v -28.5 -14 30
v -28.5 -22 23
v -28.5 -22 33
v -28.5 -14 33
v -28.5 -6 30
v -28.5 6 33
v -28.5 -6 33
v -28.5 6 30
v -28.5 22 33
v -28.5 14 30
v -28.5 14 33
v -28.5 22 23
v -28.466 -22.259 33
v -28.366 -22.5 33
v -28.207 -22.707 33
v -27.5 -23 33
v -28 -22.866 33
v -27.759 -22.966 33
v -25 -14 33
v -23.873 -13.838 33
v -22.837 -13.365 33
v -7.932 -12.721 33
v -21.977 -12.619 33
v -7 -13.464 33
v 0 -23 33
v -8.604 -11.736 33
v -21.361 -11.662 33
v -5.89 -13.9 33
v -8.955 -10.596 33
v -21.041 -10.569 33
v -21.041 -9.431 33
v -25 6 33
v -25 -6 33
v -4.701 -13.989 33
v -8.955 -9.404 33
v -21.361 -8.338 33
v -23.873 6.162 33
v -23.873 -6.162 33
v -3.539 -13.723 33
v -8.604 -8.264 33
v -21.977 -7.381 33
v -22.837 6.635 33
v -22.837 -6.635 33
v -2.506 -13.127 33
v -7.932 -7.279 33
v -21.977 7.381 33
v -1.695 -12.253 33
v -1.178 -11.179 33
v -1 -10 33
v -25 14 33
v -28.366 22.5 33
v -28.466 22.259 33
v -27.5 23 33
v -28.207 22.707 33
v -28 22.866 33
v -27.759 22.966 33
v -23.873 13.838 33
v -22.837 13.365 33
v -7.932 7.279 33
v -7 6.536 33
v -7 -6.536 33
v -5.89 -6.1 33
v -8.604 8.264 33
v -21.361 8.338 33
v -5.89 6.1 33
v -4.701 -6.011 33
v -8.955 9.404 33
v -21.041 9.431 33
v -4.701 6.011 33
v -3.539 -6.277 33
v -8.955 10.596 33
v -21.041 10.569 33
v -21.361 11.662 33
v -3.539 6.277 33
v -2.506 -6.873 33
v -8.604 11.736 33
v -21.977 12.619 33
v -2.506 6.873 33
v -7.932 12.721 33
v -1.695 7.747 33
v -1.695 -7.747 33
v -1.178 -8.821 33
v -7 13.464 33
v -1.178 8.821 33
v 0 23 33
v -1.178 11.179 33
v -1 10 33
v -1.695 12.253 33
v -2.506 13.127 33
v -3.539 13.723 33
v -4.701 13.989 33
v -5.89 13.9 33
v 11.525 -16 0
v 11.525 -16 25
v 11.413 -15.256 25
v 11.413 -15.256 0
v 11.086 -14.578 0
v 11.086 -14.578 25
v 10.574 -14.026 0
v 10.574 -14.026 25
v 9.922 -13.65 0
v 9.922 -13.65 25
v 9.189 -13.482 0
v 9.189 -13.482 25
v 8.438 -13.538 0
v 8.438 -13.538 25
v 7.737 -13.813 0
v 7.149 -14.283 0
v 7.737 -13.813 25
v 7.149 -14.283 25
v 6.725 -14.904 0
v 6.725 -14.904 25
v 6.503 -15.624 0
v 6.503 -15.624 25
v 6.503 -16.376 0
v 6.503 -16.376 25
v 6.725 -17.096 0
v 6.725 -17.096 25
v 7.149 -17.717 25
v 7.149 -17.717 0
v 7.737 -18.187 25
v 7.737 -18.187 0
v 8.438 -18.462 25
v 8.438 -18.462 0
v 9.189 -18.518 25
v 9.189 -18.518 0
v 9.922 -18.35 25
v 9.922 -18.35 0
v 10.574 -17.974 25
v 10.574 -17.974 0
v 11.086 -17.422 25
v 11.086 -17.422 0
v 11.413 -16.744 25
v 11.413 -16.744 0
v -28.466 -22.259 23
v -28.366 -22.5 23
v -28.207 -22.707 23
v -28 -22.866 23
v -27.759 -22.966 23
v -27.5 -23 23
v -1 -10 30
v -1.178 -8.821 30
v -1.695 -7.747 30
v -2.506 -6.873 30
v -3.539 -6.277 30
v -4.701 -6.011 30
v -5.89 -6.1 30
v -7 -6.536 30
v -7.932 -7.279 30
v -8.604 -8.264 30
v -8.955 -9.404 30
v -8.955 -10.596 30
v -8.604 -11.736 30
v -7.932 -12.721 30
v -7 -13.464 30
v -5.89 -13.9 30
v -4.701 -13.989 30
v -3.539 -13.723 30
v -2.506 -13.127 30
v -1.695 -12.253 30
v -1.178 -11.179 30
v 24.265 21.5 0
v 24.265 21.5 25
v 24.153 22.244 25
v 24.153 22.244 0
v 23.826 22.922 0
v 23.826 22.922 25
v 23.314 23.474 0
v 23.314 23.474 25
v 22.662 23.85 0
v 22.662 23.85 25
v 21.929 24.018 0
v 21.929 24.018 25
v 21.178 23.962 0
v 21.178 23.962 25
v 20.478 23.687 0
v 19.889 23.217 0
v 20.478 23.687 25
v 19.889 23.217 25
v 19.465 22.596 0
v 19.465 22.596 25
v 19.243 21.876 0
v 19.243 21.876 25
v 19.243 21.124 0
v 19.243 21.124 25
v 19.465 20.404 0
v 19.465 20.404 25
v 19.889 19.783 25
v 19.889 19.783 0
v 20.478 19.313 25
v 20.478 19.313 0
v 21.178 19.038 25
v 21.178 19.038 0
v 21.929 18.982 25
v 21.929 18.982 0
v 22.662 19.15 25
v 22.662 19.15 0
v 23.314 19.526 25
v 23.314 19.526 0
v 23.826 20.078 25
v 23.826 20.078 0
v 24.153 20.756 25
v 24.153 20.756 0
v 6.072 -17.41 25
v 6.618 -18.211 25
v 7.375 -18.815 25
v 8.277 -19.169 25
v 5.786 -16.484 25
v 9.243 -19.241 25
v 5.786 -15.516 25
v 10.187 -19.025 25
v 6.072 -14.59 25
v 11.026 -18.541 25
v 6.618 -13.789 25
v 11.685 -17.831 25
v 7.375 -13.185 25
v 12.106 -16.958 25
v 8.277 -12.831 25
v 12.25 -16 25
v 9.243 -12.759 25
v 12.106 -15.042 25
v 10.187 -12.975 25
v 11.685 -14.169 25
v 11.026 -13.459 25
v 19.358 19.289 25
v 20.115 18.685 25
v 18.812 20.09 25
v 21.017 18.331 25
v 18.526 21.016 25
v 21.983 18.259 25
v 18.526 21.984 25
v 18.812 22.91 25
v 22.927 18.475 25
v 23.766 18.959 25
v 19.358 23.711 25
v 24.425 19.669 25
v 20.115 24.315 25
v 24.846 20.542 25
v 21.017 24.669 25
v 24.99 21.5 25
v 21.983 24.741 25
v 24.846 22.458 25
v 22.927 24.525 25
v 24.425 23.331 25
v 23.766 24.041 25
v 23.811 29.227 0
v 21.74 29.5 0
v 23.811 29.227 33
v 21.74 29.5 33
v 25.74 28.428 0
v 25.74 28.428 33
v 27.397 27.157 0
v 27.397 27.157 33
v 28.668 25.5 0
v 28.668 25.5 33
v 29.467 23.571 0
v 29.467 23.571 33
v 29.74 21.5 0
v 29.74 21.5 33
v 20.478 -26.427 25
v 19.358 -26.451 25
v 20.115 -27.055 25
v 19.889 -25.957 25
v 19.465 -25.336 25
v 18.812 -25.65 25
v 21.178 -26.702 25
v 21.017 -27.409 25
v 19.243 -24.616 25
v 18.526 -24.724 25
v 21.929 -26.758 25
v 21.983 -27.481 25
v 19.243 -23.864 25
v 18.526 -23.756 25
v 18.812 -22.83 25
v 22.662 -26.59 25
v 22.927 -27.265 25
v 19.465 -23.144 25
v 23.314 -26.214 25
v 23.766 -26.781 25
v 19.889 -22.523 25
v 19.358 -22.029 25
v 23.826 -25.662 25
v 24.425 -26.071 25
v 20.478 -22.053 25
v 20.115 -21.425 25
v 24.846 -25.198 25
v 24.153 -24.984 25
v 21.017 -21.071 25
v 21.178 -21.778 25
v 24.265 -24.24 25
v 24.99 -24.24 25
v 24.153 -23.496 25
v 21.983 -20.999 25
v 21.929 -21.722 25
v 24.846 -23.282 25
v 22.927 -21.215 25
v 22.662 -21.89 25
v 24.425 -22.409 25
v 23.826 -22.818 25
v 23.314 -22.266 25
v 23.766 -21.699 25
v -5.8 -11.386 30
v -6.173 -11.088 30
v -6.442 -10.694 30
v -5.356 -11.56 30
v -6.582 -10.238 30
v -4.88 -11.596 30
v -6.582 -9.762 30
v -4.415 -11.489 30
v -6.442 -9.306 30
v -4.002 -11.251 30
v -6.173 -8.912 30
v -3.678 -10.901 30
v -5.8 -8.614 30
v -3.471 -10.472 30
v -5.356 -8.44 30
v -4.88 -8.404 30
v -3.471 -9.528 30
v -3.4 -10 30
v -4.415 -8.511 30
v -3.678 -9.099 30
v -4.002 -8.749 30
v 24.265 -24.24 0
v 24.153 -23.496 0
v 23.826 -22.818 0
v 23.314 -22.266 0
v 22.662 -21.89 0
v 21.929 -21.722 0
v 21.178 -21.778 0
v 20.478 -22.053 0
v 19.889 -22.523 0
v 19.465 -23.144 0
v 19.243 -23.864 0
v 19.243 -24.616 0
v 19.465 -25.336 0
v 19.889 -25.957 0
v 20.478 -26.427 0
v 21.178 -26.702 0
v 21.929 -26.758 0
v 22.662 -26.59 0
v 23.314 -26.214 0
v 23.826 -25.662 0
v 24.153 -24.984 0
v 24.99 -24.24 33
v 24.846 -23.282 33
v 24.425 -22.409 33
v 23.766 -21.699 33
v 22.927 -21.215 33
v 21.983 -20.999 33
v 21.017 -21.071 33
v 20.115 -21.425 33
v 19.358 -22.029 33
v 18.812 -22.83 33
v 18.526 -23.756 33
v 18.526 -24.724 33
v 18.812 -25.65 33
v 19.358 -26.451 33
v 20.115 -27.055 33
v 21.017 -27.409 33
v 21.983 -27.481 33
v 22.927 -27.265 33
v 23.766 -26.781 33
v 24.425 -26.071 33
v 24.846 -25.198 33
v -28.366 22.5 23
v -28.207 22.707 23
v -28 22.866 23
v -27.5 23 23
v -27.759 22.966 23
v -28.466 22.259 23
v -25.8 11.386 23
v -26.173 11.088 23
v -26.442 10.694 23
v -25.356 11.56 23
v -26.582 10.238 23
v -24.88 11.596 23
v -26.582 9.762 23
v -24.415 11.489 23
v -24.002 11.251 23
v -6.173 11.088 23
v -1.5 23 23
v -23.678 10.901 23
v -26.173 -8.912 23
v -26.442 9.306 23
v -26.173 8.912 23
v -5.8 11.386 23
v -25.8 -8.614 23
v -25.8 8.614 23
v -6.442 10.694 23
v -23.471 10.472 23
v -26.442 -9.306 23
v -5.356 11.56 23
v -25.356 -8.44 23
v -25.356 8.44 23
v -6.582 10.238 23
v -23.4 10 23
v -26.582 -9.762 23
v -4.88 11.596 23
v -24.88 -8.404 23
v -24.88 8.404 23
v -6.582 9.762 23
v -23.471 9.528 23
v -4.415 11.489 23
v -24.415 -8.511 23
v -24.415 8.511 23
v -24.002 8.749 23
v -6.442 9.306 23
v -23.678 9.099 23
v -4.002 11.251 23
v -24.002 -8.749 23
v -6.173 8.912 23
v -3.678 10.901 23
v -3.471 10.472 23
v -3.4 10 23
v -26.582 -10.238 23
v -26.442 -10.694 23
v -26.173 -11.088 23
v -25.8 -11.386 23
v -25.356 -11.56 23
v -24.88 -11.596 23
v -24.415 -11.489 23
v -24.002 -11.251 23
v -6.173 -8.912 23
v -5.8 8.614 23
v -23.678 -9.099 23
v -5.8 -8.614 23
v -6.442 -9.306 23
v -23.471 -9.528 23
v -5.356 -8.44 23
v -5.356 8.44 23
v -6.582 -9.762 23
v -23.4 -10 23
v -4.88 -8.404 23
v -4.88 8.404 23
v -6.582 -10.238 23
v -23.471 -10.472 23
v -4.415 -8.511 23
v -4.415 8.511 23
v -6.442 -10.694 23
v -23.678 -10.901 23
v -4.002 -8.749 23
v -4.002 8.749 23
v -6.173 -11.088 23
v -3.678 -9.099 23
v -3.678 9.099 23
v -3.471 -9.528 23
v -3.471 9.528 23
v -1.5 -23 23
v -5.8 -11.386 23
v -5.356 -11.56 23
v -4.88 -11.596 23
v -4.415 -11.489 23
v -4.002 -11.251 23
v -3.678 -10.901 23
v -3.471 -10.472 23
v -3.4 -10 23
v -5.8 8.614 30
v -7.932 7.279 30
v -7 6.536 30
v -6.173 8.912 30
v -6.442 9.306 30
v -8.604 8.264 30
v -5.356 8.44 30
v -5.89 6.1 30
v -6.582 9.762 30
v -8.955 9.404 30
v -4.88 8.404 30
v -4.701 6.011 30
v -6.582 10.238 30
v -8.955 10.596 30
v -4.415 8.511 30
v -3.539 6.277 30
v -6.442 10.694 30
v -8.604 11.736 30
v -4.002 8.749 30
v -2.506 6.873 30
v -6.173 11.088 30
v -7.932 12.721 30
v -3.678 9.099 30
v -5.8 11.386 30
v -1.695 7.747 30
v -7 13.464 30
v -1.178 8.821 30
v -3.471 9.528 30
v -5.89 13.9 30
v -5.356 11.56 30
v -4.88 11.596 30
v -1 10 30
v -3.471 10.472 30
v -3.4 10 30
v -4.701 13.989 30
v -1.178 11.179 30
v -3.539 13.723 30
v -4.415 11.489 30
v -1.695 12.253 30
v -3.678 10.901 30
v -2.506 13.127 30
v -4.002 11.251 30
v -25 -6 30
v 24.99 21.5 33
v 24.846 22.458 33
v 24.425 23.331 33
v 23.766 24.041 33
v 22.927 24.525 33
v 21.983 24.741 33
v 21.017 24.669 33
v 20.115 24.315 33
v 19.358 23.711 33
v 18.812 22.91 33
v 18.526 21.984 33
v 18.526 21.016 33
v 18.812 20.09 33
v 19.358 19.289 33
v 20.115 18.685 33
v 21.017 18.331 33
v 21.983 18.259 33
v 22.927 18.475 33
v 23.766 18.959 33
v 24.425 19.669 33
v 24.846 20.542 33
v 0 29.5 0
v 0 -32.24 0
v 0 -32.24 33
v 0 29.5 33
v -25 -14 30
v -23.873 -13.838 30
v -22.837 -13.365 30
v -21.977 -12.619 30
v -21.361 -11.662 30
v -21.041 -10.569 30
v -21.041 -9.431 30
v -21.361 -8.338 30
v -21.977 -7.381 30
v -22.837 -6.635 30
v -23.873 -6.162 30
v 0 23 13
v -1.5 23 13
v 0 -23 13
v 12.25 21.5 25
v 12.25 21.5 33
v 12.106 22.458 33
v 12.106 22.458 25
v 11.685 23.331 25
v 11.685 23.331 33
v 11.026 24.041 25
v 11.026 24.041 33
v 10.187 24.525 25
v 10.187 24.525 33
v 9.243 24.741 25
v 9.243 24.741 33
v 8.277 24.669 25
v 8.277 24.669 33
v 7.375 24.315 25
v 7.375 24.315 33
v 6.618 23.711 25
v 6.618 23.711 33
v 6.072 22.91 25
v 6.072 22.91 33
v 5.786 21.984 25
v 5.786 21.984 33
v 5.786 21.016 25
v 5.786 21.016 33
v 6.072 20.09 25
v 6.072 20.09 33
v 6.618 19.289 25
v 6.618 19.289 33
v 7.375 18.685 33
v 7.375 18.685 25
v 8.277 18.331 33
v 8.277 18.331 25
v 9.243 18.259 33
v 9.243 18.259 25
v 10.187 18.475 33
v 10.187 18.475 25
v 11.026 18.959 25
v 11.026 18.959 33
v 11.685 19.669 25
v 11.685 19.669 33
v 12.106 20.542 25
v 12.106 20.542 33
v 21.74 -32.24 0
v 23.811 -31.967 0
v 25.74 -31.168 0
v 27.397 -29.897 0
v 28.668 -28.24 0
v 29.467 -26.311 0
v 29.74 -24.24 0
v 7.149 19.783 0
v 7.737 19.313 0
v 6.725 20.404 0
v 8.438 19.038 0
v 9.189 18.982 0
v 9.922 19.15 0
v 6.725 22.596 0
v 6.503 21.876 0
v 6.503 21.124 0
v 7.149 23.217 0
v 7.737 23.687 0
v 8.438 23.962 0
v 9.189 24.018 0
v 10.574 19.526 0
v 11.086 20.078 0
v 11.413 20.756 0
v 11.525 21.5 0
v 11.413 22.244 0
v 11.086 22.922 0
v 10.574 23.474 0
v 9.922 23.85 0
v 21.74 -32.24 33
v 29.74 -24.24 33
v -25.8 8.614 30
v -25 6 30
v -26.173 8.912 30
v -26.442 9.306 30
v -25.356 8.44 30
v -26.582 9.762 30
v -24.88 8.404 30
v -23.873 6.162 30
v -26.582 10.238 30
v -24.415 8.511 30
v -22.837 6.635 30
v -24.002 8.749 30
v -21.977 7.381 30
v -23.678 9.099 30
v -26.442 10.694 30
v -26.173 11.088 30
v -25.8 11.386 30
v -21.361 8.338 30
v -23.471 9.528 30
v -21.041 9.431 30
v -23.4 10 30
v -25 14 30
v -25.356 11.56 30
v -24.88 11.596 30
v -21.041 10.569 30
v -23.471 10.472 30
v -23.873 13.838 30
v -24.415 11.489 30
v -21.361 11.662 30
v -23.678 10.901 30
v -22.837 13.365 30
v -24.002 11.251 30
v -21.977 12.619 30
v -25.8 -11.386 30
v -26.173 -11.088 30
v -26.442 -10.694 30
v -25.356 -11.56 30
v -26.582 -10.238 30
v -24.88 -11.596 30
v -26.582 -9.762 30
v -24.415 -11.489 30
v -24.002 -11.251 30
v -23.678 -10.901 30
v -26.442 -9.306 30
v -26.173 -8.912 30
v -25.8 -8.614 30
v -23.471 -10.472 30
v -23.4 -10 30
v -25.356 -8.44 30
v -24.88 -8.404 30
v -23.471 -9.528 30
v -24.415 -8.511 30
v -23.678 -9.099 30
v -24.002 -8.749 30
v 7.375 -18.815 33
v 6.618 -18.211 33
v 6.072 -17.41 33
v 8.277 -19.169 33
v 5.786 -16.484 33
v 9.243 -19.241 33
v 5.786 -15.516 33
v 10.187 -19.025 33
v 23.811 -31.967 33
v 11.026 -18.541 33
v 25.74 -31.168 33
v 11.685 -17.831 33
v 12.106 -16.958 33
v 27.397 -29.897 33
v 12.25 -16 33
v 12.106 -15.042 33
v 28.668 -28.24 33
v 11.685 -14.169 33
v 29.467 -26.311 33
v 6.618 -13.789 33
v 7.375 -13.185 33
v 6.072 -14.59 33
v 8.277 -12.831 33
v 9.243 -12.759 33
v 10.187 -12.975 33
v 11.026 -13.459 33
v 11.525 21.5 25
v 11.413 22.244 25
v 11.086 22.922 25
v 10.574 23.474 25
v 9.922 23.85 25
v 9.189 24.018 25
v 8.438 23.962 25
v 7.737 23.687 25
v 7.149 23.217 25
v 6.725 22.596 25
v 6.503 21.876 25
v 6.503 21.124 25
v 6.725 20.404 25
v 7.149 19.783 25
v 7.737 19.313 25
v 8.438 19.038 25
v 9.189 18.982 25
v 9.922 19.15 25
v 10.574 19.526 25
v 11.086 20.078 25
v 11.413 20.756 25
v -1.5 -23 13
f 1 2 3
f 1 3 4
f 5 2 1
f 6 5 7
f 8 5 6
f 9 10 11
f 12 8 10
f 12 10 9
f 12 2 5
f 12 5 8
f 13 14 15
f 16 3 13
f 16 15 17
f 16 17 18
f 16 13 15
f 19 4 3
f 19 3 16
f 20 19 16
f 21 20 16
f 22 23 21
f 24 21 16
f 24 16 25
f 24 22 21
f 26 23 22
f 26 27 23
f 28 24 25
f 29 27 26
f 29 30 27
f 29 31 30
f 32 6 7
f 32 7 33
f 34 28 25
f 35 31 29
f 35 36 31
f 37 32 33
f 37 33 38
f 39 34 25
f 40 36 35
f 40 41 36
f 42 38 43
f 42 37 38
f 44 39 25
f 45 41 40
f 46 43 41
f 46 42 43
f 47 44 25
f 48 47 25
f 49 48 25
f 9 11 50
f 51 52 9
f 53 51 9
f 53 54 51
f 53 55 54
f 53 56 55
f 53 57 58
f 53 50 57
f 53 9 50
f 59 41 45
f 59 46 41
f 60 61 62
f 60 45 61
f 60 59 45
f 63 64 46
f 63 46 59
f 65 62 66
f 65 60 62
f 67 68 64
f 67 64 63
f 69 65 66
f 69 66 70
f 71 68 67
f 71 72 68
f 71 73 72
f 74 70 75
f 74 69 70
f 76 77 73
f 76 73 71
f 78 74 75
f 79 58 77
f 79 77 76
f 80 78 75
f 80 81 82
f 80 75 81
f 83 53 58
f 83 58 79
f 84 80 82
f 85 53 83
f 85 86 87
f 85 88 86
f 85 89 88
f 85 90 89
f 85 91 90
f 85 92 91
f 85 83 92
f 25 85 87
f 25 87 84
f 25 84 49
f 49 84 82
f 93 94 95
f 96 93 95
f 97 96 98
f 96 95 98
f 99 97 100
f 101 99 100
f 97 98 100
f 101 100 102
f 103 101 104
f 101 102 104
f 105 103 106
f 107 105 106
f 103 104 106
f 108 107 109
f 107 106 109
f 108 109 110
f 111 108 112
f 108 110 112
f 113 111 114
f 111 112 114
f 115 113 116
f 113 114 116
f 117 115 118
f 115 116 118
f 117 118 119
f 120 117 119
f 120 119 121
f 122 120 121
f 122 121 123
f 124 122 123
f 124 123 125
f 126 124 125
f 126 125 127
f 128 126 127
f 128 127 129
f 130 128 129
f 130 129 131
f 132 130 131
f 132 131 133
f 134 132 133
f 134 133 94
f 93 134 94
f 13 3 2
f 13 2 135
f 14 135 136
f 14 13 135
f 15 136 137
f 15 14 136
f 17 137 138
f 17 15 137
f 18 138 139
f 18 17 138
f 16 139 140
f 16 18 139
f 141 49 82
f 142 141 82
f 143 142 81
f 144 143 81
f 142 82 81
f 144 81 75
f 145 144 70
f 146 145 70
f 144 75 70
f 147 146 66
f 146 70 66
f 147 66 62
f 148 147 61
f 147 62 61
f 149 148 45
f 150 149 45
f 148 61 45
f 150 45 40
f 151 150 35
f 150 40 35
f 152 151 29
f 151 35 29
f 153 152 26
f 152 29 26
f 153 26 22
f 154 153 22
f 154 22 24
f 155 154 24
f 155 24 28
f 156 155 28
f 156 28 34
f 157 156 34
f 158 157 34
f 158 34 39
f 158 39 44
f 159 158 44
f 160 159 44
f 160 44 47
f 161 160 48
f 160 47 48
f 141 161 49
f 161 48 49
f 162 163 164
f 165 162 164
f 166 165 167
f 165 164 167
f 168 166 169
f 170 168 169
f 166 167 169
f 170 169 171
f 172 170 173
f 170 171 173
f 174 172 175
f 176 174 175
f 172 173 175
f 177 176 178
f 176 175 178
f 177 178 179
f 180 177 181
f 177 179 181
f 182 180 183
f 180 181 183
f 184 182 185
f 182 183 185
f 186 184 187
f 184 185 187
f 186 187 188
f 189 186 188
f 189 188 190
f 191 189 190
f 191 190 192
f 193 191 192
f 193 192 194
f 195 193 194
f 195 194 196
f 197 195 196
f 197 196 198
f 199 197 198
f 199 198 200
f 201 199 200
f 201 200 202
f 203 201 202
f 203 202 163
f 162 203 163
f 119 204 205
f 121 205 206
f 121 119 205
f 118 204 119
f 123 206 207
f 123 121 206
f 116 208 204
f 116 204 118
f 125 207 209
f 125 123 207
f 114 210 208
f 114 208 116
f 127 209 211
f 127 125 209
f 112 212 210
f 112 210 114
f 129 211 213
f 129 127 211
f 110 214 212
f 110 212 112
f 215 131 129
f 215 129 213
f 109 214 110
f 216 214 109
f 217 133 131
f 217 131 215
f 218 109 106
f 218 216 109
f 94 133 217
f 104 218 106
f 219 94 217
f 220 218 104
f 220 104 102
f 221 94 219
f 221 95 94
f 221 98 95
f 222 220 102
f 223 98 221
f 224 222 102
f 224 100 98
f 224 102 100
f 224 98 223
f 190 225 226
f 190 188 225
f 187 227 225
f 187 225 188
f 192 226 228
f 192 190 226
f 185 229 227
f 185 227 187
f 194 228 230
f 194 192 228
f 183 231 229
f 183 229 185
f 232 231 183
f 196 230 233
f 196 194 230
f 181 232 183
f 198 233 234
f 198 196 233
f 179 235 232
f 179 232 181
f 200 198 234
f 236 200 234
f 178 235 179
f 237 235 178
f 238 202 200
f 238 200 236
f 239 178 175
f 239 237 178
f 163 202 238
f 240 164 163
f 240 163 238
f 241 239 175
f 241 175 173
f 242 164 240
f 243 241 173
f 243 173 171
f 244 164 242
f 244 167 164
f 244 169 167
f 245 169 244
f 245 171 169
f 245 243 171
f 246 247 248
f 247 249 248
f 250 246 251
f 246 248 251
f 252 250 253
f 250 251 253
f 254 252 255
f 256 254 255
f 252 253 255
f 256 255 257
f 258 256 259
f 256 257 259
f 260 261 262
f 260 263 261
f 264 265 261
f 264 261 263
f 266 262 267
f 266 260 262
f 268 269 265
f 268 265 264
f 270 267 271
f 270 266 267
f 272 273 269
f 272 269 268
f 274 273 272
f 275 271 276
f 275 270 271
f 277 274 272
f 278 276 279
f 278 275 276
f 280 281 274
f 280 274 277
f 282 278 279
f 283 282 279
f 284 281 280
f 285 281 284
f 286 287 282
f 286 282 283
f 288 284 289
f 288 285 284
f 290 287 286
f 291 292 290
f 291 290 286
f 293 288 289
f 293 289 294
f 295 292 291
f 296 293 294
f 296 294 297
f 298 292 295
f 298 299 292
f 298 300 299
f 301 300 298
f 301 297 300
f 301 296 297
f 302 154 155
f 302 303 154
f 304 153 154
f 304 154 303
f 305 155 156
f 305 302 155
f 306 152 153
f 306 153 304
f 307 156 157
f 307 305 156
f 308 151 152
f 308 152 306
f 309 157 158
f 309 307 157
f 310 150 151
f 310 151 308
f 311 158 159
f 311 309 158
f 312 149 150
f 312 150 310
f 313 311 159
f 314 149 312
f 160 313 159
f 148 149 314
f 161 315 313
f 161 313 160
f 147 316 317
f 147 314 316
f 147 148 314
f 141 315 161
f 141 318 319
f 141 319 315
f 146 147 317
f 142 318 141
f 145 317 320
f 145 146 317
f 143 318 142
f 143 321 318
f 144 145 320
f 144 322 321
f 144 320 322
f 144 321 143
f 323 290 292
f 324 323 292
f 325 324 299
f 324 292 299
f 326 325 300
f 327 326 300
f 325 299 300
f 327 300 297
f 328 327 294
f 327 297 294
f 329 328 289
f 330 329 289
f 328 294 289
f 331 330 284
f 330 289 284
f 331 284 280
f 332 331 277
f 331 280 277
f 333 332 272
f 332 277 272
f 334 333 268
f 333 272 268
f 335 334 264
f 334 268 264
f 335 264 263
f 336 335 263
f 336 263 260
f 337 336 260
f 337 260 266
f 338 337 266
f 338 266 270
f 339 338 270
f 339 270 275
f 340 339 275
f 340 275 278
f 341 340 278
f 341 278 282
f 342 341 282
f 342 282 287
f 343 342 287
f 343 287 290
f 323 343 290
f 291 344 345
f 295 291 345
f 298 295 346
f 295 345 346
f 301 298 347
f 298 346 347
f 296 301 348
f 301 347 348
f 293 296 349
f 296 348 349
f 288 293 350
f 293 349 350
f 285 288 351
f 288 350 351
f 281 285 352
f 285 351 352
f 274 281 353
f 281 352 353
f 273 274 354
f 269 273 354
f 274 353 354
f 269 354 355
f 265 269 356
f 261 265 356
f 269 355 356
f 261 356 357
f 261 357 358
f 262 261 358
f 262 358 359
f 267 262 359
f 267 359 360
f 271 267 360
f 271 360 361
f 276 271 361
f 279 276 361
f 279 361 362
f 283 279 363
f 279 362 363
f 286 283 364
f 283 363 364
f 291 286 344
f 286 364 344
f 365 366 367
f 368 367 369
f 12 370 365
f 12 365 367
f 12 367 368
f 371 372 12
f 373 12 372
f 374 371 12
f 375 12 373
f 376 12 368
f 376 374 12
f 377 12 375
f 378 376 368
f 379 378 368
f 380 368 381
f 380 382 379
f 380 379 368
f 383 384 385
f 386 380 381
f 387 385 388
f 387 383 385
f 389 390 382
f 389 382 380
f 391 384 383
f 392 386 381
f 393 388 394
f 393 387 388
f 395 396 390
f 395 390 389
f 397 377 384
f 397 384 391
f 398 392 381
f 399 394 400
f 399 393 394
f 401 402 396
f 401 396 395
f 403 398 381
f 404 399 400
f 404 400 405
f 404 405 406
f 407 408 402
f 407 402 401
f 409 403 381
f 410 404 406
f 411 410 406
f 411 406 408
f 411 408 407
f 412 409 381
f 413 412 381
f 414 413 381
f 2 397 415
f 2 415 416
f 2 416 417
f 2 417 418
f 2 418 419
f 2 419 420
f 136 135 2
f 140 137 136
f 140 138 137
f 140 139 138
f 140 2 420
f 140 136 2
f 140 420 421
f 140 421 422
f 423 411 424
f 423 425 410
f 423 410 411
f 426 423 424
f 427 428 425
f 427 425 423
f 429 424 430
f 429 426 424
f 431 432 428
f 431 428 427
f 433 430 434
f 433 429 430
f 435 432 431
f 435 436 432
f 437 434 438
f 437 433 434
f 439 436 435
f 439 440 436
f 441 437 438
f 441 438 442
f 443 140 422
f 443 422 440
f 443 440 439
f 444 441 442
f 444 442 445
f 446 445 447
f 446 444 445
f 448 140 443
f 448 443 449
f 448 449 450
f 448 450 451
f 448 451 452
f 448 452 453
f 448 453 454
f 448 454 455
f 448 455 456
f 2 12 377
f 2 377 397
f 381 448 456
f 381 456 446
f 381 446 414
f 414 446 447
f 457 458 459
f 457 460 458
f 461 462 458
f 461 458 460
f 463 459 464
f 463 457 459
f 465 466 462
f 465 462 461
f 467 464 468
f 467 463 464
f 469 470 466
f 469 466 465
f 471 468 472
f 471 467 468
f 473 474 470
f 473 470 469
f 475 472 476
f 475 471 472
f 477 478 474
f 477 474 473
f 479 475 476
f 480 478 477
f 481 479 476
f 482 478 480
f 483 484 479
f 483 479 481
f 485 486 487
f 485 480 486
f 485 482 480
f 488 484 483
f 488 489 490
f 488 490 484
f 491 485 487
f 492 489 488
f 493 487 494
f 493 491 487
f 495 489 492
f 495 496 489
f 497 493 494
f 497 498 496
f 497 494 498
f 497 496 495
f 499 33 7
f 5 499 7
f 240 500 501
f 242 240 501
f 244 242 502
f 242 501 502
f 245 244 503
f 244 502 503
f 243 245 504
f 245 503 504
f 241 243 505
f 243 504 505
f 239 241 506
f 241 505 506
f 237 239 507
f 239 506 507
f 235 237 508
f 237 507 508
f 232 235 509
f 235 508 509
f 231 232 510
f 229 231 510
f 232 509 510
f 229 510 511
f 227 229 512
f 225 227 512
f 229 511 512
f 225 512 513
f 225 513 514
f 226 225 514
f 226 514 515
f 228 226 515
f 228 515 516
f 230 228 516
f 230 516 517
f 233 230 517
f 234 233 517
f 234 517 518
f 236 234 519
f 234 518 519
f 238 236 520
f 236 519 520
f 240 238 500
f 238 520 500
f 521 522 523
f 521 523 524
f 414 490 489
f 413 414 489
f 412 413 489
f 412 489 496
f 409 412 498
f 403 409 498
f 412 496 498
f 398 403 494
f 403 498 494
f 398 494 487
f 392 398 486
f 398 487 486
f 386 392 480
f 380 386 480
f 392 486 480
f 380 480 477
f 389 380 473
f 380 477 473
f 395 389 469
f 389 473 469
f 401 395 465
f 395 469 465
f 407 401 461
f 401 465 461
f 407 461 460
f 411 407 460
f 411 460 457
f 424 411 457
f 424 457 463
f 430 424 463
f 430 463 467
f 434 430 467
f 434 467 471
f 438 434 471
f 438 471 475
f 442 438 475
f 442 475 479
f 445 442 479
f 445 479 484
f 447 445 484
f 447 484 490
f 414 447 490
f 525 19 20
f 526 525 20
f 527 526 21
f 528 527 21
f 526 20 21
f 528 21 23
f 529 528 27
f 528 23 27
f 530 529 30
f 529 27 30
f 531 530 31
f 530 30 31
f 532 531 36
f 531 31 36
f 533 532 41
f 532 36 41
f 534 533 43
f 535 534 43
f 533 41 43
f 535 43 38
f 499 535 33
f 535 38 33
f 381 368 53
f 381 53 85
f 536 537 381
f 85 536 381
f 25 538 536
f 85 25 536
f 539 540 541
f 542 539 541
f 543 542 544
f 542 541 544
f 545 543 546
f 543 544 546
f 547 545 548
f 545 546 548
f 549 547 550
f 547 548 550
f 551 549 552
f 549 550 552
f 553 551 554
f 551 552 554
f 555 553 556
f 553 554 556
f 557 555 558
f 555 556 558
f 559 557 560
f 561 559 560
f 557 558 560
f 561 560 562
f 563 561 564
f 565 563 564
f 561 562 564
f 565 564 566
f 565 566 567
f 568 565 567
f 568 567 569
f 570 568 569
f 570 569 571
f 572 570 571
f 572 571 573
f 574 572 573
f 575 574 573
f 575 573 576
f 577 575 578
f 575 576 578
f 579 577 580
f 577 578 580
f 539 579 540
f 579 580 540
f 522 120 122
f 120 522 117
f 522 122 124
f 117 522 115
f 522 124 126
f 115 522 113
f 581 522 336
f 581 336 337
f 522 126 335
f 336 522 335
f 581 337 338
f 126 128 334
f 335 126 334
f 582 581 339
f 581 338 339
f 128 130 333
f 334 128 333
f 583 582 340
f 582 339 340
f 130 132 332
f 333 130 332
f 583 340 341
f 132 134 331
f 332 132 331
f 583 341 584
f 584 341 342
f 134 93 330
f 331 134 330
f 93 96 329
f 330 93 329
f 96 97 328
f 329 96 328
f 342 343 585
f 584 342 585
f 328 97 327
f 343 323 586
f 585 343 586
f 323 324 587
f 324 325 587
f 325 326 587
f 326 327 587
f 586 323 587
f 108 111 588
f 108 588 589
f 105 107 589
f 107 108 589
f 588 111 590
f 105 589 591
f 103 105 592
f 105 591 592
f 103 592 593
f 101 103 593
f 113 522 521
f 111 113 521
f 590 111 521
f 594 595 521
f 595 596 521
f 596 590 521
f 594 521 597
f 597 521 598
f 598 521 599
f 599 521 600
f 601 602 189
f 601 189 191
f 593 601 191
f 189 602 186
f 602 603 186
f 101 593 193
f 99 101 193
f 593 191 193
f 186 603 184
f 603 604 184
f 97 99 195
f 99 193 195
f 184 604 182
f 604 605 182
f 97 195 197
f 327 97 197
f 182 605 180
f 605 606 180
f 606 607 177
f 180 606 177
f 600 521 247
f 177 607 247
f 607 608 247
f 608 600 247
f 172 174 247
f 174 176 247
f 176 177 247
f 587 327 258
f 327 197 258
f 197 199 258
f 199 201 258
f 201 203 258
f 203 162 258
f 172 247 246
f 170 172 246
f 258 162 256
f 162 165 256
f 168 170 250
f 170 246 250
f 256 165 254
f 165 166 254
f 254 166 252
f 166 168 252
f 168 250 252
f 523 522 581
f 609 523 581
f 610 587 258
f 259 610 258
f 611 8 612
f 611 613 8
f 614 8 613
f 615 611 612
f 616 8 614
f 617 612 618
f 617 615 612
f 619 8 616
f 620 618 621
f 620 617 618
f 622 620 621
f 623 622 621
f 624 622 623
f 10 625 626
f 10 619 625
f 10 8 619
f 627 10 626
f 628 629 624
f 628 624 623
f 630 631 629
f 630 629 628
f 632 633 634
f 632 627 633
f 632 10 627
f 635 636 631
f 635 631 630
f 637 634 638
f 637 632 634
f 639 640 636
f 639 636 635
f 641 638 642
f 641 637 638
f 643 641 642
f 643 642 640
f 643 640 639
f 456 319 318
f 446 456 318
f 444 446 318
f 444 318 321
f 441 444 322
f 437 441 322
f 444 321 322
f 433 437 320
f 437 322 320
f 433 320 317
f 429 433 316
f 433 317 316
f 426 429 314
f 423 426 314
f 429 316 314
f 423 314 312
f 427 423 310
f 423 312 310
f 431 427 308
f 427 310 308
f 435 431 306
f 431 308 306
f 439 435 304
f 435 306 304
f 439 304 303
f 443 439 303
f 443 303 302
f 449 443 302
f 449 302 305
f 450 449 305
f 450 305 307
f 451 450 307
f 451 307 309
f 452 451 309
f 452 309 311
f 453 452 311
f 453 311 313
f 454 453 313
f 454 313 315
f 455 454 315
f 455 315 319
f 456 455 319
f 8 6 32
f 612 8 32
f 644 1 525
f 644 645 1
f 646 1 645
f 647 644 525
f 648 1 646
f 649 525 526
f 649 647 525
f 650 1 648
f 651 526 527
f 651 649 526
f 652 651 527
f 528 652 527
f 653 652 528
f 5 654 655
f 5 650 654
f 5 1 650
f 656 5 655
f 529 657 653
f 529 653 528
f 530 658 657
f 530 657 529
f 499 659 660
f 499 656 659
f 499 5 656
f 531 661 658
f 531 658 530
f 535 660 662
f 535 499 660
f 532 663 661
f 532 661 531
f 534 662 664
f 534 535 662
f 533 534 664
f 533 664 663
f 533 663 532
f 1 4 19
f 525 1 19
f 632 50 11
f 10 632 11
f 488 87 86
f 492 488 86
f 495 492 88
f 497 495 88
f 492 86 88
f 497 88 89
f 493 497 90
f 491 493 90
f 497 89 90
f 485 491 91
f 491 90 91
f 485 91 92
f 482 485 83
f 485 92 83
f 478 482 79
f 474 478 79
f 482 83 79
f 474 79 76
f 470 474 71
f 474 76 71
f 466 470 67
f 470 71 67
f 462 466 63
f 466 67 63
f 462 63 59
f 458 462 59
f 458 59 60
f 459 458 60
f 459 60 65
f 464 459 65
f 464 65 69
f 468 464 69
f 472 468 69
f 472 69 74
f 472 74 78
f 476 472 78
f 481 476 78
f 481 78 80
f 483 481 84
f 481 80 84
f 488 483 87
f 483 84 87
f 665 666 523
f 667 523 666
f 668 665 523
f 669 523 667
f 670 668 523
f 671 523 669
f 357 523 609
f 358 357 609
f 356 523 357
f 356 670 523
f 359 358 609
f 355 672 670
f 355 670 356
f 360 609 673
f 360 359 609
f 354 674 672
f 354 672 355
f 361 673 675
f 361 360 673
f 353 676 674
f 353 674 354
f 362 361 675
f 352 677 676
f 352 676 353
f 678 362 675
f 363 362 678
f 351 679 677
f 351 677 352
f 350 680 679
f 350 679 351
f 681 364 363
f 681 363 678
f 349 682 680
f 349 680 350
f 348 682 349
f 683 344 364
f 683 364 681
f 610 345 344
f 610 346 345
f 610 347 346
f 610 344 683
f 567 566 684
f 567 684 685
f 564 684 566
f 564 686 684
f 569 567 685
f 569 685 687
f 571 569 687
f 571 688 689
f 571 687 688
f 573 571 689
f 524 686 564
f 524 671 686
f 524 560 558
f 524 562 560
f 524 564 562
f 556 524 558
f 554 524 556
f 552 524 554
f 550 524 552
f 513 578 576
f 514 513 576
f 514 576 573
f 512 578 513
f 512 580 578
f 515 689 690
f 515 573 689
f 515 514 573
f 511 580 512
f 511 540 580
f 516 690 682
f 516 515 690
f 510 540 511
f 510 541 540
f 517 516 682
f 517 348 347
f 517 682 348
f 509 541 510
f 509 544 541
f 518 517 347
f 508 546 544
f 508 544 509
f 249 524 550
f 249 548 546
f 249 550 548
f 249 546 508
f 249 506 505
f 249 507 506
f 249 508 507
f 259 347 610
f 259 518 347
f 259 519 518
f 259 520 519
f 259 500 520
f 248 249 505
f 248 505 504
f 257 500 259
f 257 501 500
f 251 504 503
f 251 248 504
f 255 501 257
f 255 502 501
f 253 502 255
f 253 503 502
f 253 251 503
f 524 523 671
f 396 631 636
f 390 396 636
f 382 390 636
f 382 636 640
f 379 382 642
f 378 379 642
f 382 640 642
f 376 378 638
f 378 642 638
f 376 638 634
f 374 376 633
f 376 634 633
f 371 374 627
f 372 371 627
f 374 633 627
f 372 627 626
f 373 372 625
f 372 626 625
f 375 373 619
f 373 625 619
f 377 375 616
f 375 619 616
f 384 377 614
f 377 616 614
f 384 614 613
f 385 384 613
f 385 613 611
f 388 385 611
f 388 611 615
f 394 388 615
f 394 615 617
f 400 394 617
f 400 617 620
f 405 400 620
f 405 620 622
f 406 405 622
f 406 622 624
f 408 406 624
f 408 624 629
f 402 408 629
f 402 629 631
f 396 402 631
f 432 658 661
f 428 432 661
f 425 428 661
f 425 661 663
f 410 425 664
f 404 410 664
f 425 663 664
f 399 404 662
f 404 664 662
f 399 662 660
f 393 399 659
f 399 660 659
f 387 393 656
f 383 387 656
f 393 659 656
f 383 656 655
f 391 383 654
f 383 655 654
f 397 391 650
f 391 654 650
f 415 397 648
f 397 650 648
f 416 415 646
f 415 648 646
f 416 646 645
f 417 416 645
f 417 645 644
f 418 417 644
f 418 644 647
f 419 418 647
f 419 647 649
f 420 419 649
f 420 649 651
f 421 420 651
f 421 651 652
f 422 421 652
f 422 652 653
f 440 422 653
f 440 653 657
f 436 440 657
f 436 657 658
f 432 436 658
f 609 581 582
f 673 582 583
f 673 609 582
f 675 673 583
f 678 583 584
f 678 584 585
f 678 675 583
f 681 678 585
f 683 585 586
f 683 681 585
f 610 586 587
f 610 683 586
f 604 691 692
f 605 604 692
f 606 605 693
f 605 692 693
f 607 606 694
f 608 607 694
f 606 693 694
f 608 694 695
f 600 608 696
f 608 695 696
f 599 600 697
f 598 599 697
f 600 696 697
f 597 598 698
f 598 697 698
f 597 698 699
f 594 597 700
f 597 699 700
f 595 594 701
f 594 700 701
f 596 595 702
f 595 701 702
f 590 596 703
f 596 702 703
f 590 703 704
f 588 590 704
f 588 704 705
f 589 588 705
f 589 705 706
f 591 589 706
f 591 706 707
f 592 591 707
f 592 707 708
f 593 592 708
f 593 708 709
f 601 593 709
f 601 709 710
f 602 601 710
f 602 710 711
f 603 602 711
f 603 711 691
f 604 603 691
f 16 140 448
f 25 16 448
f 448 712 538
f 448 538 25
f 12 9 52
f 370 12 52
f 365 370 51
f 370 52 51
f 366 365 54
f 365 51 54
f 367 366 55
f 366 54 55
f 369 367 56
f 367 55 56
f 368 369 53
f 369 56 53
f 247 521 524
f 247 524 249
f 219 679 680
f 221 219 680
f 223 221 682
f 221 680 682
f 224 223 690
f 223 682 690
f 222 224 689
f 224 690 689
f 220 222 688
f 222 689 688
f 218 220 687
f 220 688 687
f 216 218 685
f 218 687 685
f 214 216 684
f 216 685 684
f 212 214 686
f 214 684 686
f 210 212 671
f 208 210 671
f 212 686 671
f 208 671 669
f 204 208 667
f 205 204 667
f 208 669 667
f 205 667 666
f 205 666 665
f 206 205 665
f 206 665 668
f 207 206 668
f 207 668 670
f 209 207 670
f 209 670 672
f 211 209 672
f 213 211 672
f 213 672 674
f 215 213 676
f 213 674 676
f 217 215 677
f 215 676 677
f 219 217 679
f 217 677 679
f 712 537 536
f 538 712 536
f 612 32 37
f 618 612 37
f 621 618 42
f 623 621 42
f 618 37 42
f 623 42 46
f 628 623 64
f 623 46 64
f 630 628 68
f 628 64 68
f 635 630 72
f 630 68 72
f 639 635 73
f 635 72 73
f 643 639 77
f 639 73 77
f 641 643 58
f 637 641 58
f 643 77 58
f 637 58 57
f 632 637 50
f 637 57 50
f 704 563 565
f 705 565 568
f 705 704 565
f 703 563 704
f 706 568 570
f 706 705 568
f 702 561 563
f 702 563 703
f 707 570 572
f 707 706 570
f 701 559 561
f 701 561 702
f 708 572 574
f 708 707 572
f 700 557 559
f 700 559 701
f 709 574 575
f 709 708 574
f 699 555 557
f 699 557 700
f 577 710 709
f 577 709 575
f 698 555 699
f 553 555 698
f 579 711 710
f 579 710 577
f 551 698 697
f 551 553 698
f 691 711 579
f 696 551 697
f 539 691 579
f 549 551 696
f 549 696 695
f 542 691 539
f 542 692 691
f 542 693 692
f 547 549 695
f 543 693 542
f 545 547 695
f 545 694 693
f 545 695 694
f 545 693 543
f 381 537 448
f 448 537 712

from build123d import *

# Parameters (mm, degrees)
SKETCH_W        = 28.5
SKETCH_H        = 46
PAD_DEPTH       = 20
FILLET_R        = 1
SKETCH001_R     = 1.6
POCKET_DEPTH    = 20.001
SKETCH002_W     = 27
SKETCH002_H     = 46
POCKET001_DEPTH = 10
SKETCH003_R     = 4
POCKET002_DEPTH = 3
SKETCH004_W     = 29.74
SKETCH004_H     = 61.74
PAD001_DEPTH    = 33
SKETCH005_R     = 2.525
POCKET003_DEPTH = 33.001
SKETCH006_R     = 3.25
POCKET004_DEPTH = 8
FILLET001_R     = 8


with BuildPart() as block_mount_12_template:
    # Sketch → Pad (new body)
    with BuildSketch(Plane.XY):
        with Locations((-14.25, 0)):
            Rectangle(SKETCH_W, SKETCH_H)
    extrude(amount=PAD_DEPTH)

    # Fillet
    fillet_edges = [block_mount_12_template.edges().sort_by_distance(p)[0] for p in [
        (-28.5, 23, 10),
        (-28.5, -23, 10),
    ]]
    fillet(fillet_edges, radius=FILLET_R)

    # Sketch001 (on Face5 of Fillet) → Pocket (cut, through all)
    with BuildSketch(Plane.XY.offset(20)):
        with Locations((-25, 10)):
            Circle(SKETCH001_R)
        with Locations((-5, 10)):
            Circle(SKETCH001_R)
        with Locations((-25, -10)):
            Circle(SKETCH001_R)
        with Locations((-5, -10)):
            Circle(SKETCH001_R)
    extrude(amount=-POCKET_DEPTH, mode=Mode.SUBTRACT)

    # Sketch002 (on Face2 of Pocket) → Pocket001 (cut)
    with BuildSketch(Plane(origin=(0, 0, 0), x_dir=(1, 0, 0), z_dir=(0, 0, -1))):
        with Locations((-15, 0)):
            Rectangle(SKETCH002_W, SKETCH002_H)
    extrude(amount=-POCKET001_DEPTH, mode=Mode.SUBTRACT)

    # Sketch003 (on Face4 of Pocket001) → Pocket002 (cut)
    with BuildSketch(Plane.XY.offset(20)):
        with Locations((-5, 10)):
            Circle(SKETCH003_R)
        with Locations((-5, -10)):
            Circle(SKETCH003_R)
        with BuildLine():
            ThreePointArc((-25, -14), (-21, -10), (-25, -6))
            Line((-25, -6), (-28.5, -6))
            Line((-28.5, -6), (-28.5, -14))
            Line((-28.5, -14), (-25, -14))
        make_face()
        with BuildLine():
            ThreePointArc((-25, 6), (-21, 10), (-25, 14))
            Line((-25, 14), (-28.5, 14))
            Line((-28.5, 14), (-28.5, 6))
            Line((-28.5, 6), (-25, 6))
        make_face()
    extrude(amount=-POCKET002_DEPTH, mode=Mode.SUBTRACT)


with BuildPart() as block_mount_12_template_1:
    # Body placement: moved
    add(block_mount_12_template.part.moved(Location((0, 0, 13))))


with BuildPart() as body_template:
    # Sketch004 → Pad001 (new body)
    with BuildSketch(Plane.XY):
        with Locations((14.87, -1.37)):
            Rectangle(SKETCH004_W, SKETCH004_H)
    extrude(amount=PAD001_DEPTH)

    # Sketch005 (on Face6 of Pad001) → Pocket003 (cut, through all)
    with BuildSketch(Plane.XY.offset(33)):
        with Locations((9, 21.5)):
            Circle(SKETCH005_R)
        with Locations((21.74, -24.24)):
            Circle(SKETCH005_R)
        with Locations((21.74, 21.5)):
            Circle(SKETCH005_R)
        with Locations((9, -16)):
            Circle(SKETCH005_R)
    extrude(amount=-POCKET003_DEPTH, mode=Mode.SUBTRACT)

    # Sketch006 (on Face5 of Pocket003) → Pocket004 (cut)
    with BuildSketch(Plane.XY.offset(33)):
        with Locations((21.74, 21.5)):
            Circle(SKETCH006_R)
        with Locations((9, 21.5)):
            Circle(SKETCH006_R)
        with Locations((9, -16)):
            Circle(SKETCH006_R)
        with Locations((21.74, -24.24)):
            Circle(SKETCH006_R)
    extrude(amount=-POCKET004_DEPTH, mode=Mode.SUBTRACT)

    # Fillet001
    fillet001_edges = [body_template.edges().sort_by_distance(p)[0] for p in [
        (29.74, -32.24, 16.5),
        (29.74, 29.5, 16.5),
    ]]
    fillet(fillet001_edges, radius=FILLET001_R)


solid = Compound([block_mount_12_template_1.part, body_template.part])
